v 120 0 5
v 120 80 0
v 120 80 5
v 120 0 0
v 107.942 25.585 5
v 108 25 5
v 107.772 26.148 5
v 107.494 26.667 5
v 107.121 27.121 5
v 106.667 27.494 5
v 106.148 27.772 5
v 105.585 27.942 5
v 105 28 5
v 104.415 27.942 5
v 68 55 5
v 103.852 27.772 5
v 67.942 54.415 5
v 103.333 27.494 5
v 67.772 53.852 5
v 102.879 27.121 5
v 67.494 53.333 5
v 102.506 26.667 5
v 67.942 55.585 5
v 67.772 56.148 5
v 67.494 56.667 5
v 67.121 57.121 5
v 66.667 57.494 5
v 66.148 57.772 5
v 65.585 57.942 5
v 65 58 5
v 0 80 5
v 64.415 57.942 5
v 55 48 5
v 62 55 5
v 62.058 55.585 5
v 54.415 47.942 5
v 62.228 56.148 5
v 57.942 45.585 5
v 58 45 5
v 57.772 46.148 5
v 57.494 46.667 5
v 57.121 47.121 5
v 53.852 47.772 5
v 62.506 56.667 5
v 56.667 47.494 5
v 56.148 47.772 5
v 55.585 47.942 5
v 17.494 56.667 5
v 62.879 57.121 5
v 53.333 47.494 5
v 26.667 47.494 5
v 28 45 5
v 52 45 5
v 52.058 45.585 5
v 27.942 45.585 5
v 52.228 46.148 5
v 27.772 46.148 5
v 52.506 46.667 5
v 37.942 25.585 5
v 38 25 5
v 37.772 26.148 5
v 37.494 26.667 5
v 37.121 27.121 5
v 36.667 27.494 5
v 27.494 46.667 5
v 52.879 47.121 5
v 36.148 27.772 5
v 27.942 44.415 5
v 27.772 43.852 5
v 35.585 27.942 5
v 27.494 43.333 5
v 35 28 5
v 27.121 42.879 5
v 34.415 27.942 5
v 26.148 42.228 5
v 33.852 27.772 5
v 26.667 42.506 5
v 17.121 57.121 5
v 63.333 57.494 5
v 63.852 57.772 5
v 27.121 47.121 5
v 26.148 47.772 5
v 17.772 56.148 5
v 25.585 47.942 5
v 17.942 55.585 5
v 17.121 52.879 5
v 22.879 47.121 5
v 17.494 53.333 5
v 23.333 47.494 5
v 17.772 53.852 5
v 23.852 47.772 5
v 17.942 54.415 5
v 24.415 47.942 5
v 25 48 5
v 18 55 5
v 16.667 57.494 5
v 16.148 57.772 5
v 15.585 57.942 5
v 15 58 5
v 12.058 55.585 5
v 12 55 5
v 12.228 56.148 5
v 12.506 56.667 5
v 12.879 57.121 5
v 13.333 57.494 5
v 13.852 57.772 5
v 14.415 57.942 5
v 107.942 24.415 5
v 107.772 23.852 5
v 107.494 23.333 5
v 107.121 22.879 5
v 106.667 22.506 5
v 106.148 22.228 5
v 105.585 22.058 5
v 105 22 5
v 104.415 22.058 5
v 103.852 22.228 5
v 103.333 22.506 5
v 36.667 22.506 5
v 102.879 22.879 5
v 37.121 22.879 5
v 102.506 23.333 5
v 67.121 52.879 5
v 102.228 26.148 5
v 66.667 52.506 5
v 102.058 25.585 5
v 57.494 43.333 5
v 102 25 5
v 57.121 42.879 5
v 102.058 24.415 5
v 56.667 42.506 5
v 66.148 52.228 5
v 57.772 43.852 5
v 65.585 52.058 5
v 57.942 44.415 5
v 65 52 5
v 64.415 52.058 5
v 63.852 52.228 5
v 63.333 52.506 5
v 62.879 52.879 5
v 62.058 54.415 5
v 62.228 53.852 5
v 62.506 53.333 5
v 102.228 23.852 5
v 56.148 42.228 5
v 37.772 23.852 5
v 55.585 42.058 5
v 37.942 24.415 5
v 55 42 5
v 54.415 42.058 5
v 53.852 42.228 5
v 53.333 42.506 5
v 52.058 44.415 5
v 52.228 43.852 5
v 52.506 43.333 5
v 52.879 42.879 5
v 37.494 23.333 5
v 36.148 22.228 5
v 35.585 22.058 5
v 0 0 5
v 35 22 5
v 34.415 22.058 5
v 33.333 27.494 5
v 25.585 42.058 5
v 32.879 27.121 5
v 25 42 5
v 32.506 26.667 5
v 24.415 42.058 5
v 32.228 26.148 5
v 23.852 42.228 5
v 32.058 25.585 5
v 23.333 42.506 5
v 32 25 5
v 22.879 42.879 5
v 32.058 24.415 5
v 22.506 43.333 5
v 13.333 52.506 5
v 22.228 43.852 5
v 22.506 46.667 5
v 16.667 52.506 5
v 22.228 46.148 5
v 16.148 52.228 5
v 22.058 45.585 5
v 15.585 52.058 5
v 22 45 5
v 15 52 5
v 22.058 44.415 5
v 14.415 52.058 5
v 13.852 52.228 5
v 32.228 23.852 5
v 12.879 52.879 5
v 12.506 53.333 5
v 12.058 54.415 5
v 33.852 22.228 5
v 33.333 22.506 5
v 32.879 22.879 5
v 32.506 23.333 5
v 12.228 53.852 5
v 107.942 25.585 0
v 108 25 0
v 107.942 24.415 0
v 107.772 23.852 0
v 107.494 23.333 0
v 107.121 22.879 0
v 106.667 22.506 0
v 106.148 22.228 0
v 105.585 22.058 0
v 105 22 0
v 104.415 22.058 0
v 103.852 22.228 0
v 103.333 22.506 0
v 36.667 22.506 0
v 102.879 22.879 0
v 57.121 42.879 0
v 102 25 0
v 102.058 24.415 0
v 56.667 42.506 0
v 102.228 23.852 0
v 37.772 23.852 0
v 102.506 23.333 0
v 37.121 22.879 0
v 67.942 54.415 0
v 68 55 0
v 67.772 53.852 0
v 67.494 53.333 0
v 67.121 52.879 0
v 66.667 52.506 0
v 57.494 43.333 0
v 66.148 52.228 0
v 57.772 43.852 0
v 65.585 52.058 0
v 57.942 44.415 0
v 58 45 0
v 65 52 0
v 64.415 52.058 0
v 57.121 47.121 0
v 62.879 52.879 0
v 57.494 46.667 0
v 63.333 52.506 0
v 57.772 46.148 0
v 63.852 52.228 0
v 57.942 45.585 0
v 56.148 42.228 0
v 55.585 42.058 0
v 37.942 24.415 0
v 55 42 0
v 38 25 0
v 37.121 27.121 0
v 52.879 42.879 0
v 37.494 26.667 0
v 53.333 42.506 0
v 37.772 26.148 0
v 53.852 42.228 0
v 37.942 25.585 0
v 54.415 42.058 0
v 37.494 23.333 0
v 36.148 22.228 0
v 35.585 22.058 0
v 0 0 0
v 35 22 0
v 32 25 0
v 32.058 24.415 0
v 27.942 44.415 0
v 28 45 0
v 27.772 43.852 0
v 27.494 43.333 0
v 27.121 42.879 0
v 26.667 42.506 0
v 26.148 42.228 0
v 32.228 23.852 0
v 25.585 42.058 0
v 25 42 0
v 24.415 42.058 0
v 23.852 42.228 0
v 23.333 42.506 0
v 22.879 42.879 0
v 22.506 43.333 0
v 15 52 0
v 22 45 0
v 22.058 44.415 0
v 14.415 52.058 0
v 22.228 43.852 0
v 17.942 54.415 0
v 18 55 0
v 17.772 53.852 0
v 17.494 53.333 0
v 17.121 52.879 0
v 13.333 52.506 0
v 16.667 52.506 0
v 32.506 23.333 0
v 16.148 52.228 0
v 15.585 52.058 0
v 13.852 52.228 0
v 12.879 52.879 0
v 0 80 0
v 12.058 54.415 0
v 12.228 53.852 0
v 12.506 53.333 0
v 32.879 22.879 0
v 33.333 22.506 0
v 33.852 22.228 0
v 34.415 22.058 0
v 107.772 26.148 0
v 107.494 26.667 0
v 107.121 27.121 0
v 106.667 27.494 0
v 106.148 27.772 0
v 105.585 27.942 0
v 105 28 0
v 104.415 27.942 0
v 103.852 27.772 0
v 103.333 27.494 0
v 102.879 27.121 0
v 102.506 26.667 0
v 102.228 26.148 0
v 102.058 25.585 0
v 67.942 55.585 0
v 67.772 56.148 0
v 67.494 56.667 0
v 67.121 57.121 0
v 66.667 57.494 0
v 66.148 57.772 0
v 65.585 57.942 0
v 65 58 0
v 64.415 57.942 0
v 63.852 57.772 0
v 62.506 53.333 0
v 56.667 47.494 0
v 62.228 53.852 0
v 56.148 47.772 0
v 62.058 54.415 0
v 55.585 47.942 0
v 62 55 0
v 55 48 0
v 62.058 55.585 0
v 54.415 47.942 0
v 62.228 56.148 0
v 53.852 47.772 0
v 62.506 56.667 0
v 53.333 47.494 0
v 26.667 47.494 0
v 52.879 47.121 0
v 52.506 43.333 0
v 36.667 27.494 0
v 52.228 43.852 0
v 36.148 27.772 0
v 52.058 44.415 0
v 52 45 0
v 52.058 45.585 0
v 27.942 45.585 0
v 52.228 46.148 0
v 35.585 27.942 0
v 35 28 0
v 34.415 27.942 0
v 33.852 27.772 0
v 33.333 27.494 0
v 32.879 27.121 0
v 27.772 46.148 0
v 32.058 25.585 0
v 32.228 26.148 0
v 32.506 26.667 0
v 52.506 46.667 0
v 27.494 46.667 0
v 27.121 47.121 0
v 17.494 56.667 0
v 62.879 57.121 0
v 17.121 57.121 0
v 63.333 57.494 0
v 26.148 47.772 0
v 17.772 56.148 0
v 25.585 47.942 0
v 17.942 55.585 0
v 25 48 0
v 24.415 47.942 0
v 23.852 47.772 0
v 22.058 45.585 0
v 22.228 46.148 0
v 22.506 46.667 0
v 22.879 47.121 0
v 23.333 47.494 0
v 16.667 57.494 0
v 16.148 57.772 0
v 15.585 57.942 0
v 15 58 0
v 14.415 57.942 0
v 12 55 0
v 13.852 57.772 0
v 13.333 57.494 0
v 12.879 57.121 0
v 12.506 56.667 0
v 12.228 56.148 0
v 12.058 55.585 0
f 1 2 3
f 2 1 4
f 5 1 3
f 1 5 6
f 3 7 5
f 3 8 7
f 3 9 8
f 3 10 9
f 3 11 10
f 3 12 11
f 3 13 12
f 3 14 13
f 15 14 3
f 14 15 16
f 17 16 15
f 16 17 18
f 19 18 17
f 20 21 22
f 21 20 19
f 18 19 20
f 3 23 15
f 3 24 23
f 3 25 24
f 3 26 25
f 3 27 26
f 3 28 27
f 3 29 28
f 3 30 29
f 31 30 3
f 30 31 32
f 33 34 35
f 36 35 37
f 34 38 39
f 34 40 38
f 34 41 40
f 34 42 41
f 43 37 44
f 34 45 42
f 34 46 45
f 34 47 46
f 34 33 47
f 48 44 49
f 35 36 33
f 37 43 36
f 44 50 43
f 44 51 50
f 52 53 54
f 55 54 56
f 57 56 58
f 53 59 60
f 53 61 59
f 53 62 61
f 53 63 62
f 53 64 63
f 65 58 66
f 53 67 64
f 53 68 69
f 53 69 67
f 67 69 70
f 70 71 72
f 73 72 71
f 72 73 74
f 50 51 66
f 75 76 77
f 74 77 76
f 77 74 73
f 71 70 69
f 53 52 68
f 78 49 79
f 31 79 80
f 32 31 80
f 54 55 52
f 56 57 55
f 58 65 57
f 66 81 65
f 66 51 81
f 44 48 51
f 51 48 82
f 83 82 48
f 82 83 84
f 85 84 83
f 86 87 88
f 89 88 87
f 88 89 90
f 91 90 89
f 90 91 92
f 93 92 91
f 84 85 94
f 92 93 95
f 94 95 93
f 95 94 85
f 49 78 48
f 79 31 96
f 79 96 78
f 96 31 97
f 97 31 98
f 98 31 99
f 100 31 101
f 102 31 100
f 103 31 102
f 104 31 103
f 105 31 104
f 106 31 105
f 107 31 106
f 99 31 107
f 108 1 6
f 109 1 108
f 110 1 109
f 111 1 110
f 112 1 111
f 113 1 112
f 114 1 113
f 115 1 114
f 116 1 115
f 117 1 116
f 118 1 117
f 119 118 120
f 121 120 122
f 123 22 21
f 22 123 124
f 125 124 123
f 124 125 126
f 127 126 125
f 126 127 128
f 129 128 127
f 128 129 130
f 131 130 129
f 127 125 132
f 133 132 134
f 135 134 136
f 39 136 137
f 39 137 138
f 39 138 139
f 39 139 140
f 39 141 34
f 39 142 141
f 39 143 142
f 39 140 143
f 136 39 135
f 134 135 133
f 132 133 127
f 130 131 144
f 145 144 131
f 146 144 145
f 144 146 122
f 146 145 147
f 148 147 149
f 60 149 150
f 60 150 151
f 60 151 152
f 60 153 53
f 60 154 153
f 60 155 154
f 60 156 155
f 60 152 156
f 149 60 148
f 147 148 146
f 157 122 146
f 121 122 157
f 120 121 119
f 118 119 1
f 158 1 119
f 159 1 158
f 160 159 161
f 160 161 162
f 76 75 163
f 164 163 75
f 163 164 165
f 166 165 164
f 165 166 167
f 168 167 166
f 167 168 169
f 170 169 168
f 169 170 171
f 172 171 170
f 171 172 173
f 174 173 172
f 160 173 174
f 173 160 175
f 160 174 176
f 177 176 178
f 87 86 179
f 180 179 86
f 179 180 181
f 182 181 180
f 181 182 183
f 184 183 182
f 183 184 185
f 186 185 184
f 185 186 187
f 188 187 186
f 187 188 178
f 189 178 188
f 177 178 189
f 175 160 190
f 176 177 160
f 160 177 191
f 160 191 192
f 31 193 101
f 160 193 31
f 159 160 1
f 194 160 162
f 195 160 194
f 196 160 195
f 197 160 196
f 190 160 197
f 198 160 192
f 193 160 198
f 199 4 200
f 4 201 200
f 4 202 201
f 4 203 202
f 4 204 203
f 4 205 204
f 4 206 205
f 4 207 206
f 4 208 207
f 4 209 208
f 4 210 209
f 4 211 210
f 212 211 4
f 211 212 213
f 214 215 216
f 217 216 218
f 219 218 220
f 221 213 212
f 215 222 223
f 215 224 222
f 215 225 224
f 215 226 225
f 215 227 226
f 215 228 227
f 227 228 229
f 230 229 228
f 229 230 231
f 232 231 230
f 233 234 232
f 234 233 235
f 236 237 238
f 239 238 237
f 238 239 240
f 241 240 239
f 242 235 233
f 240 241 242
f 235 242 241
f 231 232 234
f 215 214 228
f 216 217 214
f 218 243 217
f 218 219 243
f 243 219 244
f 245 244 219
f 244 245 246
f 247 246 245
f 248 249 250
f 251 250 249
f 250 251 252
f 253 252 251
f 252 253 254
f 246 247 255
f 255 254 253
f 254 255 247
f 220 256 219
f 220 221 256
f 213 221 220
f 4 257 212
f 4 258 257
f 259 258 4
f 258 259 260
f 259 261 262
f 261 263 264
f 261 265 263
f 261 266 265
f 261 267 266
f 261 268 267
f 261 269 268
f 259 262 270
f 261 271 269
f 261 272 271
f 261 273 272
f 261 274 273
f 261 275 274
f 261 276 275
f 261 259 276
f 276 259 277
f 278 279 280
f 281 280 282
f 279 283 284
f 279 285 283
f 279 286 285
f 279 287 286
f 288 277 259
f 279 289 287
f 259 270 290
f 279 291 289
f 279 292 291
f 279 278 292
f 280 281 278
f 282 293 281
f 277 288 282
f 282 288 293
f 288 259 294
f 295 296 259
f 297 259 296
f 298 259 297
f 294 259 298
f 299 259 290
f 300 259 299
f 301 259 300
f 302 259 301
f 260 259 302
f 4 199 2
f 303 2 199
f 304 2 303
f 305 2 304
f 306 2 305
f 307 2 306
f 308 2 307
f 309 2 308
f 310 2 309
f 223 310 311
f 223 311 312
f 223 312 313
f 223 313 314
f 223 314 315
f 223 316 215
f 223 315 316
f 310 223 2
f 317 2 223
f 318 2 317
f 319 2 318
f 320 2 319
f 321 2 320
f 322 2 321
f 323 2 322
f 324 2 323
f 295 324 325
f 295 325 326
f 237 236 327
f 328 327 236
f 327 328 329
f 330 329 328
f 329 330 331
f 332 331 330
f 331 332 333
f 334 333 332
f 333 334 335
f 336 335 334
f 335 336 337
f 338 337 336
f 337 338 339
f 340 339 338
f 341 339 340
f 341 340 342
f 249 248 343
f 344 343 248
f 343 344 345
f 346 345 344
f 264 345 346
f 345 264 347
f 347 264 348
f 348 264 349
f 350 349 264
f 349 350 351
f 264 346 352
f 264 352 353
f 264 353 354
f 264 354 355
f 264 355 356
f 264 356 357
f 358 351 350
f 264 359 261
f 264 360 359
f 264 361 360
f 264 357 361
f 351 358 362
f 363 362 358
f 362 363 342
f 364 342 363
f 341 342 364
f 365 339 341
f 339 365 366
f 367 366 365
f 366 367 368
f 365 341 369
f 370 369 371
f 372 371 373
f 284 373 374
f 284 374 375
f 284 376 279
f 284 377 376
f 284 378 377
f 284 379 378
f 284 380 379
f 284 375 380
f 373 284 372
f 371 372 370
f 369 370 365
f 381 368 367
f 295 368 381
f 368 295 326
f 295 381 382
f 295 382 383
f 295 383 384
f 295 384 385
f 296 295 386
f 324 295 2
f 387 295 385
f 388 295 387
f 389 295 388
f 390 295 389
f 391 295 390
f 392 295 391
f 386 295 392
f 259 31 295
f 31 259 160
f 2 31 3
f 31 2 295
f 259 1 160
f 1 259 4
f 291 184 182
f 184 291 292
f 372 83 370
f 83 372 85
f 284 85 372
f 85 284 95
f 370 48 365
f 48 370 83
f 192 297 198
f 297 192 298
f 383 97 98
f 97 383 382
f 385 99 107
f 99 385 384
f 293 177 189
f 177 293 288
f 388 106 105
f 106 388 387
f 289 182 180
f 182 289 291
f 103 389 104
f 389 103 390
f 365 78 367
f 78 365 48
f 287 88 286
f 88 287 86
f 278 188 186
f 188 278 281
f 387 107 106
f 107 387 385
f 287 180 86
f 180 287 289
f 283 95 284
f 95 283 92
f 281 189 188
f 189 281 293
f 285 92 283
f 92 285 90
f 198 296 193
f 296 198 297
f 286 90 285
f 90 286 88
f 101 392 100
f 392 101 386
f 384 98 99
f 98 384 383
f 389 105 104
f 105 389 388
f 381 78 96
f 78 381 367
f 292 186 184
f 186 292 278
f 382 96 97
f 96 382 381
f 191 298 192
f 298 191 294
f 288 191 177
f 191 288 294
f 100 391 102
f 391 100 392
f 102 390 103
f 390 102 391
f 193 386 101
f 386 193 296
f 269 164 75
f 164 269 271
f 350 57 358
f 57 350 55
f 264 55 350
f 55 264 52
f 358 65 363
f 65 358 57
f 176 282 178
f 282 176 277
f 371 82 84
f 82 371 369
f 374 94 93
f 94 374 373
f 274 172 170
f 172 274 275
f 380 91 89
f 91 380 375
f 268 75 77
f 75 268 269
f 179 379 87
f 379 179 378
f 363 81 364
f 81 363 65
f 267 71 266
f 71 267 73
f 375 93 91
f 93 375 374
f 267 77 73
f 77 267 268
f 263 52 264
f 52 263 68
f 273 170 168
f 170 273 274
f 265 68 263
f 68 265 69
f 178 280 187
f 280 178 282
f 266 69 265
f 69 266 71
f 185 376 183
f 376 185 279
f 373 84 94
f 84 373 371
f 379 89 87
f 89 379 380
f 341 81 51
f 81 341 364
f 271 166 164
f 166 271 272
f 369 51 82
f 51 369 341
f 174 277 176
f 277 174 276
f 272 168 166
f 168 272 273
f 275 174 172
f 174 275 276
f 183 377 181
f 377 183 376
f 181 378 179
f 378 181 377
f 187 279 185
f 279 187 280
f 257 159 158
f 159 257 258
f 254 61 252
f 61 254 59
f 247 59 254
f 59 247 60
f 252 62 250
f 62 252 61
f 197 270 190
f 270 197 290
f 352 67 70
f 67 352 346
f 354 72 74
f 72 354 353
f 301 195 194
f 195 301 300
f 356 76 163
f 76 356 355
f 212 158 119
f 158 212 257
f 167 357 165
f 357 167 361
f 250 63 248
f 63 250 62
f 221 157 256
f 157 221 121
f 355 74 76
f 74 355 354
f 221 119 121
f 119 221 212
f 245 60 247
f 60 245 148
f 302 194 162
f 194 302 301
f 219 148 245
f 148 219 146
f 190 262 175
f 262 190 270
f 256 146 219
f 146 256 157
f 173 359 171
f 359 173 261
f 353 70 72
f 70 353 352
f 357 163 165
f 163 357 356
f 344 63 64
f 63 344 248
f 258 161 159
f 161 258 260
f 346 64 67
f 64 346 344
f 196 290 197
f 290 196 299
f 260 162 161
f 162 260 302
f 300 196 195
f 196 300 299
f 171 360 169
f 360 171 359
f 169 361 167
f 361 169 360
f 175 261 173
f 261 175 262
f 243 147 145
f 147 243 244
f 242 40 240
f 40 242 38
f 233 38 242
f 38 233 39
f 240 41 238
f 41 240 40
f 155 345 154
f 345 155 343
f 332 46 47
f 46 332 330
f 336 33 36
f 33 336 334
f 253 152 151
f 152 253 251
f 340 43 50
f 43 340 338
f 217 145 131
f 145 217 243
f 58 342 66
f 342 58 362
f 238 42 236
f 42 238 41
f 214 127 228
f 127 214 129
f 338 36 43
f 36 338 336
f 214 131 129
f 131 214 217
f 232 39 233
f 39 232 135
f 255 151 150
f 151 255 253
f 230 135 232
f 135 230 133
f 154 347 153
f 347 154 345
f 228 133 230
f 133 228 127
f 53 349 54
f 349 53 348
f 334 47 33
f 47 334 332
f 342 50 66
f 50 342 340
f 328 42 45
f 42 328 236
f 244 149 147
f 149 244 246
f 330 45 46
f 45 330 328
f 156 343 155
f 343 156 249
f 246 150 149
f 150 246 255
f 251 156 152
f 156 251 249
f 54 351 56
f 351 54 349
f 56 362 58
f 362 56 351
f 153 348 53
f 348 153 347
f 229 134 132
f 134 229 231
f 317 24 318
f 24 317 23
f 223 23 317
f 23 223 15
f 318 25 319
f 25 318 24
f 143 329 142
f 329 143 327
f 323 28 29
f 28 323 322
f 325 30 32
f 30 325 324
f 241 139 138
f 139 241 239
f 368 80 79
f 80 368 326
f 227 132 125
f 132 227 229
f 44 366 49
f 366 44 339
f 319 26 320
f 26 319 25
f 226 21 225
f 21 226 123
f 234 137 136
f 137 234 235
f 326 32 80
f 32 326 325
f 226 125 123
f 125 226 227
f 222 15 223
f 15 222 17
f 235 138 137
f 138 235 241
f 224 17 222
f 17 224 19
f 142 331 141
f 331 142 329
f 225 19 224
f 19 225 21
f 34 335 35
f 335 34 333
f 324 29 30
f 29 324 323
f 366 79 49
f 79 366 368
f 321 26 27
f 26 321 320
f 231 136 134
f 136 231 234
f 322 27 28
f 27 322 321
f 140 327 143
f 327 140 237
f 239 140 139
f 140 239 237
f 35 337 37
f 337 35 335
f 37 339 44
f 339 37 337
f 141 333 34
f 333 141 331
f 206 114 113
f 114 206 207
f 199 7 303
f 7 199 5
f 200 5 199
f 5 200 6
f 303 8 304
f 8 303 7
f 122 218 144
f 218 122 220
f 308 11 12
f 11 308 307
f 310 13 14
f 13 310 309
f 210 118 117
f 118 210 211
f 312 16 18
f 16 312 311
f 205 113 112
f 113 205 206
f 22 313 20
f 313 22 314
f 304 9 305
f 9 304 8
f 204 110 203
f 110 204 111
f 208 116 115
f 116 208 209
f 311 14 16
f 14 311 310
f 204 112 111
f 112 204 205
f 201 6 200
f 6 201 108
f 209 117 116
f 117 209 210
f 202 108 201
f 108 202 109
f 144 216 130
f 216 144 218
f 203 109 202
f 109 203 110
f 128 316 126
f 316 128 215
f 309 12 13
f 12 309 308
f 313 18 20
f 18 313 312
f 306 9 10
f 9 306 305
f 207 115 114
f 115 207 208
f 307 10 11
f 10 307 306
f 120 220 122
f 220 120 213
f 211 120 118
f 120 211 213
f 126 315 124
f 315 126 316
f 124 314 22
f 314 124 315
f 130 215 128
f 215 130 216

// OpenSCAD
$fn = 32;

// ----------------------------------------------------------------------
// Hole field: plate with holes at given coordinates
// ----------------------------------------------------------------------

// --- parameters (mm) ---
plate_l = 120;            // plate length, X
plate_w = 80;             // plate width, Y
plate_t = 5;              // plate thickness, Z
hole_d = 6;               // hole diameter

difference() {
  cube([plate_l, plate_w, plate_t]);
  translate([15, 55, -1]) cylinder(h = plate_t + 2, d = hole_d);
  translate([25, 45, -1]) cylinder(h = plate_t + 2, d = hole_d);
  translate([35, 25, -1]) cylinder(h = plate_t + 2, d = hole_d);
  translate([55, 45, -1]) cylinder(h = plate_t + 2, d = hole_d);
  translate([65, 55, -1]) cylinder(h = plate_t + 2, d = hole_d);
  translate([105, 25, -1]) cylinder(h = plate_t + 2, d = hole_d);
}
